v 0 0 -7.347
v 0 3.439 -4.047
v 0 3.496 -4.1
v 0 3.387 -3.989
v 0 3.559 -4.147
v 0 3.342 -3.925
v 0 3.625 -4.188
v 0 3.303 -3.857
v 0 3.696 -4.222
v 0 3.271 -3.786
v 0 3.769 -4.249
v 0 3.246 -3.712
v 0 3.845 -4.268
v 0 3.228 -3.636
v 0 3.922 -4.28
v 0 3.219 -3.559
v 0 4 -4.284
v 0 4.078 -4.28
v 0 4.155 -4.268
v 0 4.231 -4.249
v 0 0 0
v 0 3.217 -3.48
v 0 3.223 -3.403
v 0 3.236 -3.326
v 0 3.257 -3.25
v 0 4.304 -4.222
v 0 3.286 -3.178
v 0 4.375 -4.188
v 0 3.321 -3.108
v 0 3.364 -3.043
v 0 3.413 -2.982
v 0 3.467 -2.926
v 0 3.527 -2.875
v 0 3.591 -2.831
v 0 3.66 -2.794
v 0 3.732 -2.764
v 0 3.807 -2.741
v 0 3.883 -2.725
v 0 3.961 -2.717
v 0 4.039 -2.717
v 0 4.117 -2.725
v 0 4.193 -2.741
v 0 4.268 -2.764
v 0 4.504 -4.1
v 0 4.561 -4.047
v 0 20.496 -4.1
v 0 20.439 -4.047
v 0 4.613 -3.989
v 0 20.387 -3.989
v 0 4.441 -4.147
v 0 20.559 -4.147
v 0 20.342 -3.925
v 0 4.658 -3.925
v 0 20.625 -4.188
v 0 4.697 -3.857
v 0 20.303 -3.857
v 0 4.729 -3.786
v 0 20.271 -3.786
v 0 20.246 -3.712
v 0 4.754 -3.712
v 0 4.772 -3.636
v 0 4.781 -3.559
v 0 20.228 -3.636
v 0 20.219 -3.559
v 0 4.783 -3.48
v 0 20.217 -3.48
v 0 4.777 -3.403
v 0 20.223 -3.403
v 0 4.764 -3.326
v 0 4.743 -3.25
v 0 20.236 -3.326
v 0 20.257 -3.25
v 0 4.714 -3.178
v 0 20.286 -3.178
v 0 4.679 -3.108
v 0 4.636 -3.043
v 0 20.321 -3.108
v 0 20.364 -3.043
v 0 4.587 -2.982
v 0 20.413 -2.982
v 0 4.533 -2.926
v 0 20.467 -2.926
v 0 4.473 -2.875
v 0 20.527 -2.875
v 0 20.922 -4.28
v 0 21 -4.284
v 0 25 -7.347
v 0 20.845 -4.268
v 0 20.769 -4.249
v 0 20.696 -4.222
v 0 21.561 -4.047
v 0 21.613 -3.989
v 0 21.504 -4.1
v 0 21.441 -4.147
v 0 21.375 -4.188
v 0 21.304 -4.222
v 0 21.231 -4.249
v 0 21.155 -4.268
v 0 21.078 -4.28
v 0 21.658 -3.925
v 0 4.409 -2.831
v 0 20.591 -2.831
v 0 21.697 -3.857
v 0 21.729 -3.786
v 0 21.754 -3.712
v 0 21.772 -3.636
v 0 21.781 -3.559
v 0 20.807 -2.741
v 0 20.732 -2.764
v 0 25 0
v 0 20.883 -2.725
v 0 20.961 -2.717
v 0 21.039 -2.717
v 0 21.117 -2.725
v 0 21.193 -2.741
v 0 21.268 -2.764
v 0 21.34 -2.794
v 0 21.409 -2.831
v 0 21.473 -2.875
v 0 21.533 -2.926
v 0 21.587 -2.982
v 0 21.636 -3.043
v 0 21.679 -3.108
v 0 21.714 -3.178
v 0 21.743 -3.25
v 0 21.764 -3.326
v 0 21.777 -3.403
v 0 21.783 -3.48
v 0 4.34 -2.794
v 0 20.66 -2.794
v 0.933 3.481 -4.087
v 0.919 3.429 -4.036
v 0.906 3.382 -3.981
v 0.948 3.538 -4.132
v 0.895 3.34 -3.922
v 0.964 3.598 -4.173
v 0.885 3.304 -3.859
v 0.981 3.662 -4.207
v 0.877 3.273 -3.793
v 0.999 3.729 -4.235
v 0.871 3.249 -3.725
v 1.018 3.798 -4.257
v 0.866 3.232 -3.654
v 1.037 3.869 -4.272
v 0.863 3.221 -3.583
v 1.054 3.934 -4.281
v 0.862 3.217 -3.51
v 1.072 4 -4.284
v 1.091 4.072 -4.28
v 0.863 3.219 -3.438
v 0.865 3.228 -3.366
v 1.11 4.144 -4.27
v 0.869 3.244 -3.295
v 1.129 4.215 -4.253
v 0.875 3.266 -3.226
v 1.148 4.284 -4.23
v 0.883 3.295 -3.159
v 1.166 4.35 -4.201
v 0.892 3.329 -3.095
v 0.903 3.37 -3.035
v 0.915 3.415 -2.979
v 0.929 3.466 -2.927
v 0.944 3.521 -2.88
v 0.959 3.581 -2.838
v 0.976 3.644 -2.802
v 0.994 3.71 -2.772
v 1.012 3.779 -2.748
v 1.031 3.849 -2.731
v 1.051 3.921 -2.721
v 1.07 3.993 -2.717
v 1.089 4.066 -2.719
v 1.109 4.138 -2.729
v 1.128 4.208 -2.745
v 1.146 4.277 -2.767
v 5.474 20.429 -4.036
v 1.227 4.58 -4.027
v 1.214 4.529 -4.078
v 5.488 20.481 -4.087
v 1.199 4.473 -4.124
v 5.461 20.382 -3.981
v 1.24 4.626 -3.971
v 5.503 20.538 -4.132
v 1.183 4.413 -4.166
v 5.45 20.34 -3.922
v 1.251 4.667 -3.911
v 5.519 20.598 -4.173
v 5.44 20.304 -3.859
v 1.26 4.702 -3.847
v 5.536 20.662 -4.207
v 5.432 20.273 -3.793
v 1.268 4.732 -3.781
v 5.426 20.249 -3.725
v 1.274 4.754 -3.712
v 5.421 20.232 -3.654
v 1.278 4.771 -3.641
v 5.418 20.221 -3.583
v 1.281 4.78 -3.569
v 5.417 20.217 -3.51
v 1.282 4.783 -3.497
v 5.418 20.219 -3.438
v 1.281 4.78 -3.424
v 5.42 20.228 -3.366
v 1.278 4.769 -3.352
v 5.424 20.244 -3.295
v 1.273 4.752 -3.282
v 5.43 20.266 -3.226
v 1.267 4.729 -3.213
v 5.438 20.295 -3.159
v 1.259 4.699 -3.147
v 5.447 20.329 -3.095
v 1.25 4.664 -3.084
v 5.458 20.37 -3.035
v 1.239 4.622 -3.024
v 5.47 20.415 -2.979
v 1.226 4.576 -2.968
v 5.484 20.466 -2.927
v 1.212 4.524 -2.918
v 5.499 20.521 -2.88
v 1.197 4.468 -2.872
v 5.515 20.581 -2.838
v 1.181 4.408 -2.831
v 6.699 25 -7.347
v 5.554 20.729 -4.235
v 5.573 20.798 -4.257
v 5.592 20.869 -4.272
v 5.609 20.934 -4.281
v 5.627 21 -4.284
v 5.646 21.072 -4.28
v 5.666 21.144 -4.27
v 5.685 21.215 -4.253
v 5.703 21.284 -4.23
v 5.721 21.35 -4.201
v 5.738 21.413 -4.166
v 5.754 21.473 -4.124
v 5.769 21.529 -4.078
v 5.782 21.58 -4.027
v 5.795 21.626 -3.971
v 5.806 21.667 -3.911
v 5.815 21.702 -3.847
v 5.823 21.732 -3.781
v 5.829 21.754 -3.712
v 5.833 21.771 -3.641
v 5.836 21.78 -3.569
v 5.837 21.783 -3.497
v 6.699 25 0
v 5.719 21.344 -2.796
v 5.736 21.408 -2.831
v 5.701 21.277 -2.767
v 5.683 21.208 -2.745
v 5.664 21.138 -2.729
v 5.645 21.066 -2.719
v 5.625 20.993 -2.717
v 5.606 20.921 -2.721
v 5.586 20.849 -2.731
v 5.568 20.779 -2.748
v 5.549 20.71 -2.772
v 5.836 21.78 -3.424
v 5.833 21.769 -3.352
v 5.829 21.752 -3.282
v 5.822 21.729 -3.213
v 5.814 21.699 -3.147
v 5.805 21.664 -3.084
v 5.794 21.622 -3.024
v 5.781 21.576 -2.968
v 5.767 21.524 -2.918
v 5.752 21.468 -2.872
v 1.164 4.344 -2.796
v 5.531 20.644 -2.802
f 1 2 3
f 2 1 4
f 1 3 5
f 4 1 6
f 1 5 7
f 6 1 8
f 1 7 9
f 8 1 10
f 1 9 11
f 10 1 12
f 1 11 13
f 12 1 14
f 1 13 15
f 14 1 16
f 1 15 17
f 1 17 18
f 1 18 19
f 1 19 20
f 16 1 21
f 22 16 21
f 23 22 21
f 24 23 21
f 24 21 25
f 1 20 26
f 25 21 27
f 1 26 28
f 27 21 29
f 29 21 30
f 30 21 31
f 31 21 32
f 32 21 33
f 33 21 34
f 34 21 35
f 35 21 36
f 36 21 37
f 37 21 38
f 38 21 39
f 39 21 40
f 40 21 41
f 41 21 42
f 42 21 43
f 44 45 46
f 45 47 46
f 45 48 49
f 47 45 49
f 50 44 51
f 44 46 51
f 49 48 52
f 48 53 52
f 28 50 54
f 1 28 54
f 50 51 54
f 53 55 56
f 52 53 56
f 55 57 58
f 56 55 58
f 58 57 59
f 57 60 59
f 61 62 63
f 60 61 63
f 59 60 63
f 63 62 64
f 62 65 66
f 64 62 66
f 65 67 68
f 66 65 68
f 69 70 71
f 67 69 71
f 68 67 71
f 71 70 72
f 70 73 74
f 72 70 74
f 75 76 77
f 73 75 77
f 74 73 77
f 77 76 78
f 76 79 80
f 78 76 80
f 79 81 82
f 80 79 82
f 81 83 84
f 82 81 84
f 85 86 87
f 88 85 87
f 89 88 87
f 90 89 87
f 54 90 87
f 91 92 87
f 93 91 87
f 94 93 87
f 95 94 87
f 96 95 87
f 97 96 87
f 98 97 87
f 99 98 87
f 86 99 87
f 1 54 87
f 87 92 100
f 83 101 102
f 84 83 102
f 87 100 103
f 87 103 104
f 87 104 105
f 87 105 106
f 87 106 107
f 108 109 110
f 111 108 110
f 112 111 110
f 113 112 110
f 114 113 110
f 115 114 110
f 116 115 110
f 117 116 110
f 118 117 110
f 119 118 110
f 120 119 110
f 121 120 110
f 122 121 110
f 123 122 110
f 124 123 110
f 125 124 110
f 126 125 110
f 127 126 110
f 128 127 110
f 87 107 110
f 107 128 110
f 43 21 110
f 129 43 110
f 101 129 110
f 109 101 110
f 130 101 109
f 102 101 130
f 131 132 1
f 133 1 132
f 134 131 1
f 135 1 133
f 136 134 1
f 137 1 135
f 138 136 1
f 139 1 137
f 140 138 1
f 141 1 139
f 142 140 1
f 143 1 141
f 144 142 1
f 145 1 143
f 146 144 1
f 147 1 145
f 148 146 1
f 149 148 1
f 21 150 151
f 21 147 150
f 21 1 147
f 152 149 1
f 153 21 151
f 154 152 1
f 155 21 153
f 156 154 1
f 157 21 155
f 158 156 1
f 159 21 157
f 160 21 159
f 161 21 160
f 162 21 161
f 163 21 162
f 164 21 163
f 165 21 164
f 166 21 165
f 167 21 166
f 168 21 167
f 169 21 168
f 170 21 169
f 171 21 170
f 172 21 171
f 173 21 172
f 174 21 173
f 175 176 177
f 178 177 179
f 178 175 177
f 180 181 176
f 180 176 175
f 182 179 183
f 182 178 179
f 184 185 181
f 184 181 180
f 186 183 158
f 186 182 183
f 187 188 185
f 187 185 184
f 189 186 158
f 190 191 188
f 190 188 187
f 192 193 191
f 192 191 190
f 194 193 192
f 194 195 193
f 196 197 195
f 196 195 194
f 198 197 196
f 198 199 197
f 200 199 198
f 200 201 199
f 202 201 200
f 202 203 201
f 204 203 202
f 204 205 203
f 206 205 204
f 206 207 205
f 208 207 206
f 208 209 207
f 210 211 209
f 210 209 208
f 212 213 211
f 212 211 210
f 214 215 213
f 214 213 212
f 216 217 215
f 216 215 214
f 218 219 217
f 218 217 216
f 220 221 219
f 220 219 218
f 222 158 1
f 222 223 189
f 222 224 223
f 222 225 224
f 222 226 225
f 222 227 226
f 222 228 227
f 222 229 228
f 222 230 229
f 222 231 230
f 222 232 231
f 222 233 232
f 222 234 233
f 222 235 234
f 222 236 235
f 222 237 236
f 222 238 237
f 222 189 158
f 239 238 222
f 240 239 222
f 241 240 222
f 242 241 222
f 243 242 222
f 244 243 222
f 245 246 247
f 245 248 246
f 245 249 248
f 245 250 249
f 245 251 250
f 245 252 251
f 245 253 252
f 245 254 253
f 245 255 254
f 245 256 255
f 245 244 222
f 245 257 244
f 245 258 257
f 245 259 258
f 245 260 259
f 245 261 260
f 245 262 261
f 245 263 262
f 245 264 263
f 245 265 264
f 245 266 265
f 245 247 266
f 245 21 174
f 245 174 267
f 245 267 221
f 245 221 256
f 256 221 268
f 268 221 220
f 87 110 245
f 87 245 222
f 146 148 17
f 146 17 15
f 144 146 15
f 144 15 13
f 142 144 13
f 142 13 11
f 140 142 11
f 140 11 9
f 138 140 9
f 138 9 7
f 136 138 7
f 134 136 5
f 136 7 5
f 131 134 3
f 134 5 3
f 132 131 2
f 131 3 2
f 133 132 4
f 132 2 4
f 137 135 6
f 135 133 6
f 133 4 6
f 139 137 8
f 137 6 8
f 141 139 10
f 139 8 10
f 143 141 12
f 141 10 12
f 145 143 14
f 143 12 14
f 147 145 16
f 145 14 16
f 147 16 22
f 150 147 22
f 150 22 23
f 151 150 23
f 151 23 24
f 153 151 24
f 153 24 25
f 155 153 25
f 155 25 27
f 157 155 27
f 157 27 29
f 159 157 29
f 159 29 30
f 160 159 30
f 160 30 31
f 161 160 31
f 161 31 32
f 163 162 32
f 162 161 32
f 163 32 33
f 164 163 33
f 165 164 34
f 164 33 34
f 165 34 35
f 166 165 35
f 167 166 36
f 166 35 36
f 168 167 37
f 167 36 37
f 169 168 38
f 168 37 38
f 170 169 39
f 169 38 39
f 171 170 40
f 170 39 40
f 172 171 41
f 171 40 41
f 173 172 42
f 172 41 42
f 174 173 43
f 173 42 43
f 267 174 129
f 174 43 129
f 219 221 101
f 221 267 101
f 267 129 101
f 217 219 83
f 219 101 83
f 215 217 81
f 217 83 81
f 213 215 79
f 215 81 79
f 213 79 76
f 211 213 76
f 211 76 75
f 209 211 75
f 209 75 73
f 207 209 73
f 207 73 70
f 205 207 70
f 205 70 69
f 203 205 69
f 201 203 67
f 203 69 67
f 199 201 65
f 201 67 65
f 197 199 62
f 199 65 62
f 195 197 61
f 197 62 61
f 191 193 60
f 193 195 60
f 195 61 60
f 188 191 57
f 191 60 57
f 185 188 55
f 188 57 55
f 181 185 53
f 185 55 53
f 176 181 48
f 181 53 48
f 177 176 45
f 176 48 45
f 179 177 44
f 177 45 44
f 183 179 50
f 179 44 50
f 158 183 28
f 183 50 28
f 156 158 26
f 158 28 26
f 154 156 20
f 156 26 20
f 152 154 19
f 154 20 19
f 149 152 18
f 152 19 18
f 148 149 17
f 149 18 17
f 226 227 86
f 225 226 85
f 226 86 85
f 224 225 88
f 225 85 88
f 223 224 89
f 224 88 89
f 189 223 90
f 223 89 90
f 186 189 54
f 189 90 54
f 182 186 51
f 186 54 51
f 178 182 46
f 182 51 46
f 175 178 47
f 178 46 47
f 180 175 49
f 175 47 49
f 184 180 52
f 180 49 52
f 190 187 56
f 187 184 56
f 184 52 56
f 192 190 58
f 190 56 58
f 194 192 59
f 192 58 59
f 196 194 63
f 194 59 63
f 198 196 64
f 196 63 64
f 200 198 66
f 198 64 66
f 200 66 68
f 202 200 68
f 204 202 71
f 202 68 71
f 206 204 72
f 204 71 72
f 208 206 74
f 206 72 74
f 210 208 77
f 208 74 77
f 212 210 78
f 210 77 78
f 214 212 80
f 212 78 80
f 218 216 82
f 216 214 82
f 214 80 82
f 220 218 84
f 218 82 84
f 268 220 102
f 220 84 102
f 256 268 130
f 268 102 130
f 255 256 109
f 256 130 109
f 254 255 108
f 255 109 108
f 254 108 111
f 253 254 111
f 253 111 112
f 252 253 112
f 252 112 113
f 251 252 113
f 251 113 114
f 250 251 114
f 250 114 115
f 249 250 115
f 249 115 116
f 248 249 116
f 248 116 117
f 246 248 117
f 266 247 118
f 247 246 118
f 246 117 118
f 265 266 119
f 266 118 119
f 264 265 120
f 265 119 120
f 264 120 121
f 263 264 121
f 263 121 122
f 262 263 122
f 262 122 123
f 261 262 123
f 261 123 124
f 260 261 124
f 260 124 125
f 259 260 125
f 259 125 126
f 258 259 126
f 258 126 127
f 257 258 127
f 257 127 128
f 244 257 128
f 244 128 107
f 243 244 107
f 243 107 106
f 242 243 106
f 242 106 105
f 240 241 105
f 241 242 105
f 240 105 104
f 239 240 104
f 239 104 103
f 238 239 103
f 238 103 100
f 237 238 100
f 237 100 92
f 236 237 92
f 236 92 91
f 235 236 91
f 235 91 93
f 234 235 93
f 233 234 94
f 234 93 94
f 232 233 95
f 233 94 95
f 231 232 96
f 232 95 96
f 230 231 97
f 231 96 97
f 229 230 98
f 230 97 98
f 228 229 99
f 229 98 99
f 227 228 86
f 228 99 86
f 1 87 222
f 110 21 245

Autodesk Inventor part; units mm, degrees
ref_plane "YZ Plane" through (0, 0, 0) normal (1, 0, 0) x (0, 1, 0)
ref_plane "XZ Plane" through (0, 0, 0) normal (0, 1, 0) x (-1, 0, 0)
ref_plane "XY Plane" through (0, 0, 0) normal (0, 0, 1) x (1, 0, 0)
sketch "Esquisse1" plane through (0, 0, 0) normal (1, 0, 0) x (0, 1, 0)
  line L0 (0, 0) -> (25, 0)
  line L1 (25, 0) -> (25, -7.347)
  line L2 (25, -7.347) -> (0, -7.347)
  line L3 (0, -7.347) -> (0, 0)
  dimension "d0" = 25
  dimension "d1" = 7.347
extrude "Extrusion1" add sketch "Esquisse1" along normal blind 10
sketch "Esquisse3" plane through (10, 0, 0) normal (1, 0, 0) x (0, 0, -1)
  line L0 (0, 0) -> (7.347, 0) projected
  line L1 (0, 0) -> (3.5, 0)
  line L2 (3.5, 0) -> (3.5, 4)
  line L3 (7.347, 25) -> (0, 25) projected
  line L4 (0, 25) -> (3.5, 25)
  line L5 (3.5, 25) -> (3.5, 21)
  dimension "d7" = 3.5
  dimension "d8" = 4
  dimension "d9" = 3.5
  dimension "d10" = 4
  dimension "d11" = 90
hole "Perçage1" at (10, 4, -3.5) at (10, 21, -3.5) direction (-1, 0, 0) diameter 1.567 end through all thread size "M2x0.4" class "6H" standard "ISO Metric profile"
sketch "Esquisse4" plane through (0, 0, 0) normal (0, 0, 1) x (1, 0, 0)
  line L0 (0, 0) -> (10, 0) projected
  line L1 (0, 0) -> (6.6987, 25)
  line L2 (0, 25) -> (10, 25) projected
  line L3 (0, 0) -> (25.8819, 0) construction
  line L4 (0, 25) -> (10, 25) projected
  line L5 (10, 25) -> (10, 0) projected
  dimension "d19" = 75
extrude "Extrusion3" cut sketch "Esquisse4" against normal blind 10
properties part number "face 15°"
